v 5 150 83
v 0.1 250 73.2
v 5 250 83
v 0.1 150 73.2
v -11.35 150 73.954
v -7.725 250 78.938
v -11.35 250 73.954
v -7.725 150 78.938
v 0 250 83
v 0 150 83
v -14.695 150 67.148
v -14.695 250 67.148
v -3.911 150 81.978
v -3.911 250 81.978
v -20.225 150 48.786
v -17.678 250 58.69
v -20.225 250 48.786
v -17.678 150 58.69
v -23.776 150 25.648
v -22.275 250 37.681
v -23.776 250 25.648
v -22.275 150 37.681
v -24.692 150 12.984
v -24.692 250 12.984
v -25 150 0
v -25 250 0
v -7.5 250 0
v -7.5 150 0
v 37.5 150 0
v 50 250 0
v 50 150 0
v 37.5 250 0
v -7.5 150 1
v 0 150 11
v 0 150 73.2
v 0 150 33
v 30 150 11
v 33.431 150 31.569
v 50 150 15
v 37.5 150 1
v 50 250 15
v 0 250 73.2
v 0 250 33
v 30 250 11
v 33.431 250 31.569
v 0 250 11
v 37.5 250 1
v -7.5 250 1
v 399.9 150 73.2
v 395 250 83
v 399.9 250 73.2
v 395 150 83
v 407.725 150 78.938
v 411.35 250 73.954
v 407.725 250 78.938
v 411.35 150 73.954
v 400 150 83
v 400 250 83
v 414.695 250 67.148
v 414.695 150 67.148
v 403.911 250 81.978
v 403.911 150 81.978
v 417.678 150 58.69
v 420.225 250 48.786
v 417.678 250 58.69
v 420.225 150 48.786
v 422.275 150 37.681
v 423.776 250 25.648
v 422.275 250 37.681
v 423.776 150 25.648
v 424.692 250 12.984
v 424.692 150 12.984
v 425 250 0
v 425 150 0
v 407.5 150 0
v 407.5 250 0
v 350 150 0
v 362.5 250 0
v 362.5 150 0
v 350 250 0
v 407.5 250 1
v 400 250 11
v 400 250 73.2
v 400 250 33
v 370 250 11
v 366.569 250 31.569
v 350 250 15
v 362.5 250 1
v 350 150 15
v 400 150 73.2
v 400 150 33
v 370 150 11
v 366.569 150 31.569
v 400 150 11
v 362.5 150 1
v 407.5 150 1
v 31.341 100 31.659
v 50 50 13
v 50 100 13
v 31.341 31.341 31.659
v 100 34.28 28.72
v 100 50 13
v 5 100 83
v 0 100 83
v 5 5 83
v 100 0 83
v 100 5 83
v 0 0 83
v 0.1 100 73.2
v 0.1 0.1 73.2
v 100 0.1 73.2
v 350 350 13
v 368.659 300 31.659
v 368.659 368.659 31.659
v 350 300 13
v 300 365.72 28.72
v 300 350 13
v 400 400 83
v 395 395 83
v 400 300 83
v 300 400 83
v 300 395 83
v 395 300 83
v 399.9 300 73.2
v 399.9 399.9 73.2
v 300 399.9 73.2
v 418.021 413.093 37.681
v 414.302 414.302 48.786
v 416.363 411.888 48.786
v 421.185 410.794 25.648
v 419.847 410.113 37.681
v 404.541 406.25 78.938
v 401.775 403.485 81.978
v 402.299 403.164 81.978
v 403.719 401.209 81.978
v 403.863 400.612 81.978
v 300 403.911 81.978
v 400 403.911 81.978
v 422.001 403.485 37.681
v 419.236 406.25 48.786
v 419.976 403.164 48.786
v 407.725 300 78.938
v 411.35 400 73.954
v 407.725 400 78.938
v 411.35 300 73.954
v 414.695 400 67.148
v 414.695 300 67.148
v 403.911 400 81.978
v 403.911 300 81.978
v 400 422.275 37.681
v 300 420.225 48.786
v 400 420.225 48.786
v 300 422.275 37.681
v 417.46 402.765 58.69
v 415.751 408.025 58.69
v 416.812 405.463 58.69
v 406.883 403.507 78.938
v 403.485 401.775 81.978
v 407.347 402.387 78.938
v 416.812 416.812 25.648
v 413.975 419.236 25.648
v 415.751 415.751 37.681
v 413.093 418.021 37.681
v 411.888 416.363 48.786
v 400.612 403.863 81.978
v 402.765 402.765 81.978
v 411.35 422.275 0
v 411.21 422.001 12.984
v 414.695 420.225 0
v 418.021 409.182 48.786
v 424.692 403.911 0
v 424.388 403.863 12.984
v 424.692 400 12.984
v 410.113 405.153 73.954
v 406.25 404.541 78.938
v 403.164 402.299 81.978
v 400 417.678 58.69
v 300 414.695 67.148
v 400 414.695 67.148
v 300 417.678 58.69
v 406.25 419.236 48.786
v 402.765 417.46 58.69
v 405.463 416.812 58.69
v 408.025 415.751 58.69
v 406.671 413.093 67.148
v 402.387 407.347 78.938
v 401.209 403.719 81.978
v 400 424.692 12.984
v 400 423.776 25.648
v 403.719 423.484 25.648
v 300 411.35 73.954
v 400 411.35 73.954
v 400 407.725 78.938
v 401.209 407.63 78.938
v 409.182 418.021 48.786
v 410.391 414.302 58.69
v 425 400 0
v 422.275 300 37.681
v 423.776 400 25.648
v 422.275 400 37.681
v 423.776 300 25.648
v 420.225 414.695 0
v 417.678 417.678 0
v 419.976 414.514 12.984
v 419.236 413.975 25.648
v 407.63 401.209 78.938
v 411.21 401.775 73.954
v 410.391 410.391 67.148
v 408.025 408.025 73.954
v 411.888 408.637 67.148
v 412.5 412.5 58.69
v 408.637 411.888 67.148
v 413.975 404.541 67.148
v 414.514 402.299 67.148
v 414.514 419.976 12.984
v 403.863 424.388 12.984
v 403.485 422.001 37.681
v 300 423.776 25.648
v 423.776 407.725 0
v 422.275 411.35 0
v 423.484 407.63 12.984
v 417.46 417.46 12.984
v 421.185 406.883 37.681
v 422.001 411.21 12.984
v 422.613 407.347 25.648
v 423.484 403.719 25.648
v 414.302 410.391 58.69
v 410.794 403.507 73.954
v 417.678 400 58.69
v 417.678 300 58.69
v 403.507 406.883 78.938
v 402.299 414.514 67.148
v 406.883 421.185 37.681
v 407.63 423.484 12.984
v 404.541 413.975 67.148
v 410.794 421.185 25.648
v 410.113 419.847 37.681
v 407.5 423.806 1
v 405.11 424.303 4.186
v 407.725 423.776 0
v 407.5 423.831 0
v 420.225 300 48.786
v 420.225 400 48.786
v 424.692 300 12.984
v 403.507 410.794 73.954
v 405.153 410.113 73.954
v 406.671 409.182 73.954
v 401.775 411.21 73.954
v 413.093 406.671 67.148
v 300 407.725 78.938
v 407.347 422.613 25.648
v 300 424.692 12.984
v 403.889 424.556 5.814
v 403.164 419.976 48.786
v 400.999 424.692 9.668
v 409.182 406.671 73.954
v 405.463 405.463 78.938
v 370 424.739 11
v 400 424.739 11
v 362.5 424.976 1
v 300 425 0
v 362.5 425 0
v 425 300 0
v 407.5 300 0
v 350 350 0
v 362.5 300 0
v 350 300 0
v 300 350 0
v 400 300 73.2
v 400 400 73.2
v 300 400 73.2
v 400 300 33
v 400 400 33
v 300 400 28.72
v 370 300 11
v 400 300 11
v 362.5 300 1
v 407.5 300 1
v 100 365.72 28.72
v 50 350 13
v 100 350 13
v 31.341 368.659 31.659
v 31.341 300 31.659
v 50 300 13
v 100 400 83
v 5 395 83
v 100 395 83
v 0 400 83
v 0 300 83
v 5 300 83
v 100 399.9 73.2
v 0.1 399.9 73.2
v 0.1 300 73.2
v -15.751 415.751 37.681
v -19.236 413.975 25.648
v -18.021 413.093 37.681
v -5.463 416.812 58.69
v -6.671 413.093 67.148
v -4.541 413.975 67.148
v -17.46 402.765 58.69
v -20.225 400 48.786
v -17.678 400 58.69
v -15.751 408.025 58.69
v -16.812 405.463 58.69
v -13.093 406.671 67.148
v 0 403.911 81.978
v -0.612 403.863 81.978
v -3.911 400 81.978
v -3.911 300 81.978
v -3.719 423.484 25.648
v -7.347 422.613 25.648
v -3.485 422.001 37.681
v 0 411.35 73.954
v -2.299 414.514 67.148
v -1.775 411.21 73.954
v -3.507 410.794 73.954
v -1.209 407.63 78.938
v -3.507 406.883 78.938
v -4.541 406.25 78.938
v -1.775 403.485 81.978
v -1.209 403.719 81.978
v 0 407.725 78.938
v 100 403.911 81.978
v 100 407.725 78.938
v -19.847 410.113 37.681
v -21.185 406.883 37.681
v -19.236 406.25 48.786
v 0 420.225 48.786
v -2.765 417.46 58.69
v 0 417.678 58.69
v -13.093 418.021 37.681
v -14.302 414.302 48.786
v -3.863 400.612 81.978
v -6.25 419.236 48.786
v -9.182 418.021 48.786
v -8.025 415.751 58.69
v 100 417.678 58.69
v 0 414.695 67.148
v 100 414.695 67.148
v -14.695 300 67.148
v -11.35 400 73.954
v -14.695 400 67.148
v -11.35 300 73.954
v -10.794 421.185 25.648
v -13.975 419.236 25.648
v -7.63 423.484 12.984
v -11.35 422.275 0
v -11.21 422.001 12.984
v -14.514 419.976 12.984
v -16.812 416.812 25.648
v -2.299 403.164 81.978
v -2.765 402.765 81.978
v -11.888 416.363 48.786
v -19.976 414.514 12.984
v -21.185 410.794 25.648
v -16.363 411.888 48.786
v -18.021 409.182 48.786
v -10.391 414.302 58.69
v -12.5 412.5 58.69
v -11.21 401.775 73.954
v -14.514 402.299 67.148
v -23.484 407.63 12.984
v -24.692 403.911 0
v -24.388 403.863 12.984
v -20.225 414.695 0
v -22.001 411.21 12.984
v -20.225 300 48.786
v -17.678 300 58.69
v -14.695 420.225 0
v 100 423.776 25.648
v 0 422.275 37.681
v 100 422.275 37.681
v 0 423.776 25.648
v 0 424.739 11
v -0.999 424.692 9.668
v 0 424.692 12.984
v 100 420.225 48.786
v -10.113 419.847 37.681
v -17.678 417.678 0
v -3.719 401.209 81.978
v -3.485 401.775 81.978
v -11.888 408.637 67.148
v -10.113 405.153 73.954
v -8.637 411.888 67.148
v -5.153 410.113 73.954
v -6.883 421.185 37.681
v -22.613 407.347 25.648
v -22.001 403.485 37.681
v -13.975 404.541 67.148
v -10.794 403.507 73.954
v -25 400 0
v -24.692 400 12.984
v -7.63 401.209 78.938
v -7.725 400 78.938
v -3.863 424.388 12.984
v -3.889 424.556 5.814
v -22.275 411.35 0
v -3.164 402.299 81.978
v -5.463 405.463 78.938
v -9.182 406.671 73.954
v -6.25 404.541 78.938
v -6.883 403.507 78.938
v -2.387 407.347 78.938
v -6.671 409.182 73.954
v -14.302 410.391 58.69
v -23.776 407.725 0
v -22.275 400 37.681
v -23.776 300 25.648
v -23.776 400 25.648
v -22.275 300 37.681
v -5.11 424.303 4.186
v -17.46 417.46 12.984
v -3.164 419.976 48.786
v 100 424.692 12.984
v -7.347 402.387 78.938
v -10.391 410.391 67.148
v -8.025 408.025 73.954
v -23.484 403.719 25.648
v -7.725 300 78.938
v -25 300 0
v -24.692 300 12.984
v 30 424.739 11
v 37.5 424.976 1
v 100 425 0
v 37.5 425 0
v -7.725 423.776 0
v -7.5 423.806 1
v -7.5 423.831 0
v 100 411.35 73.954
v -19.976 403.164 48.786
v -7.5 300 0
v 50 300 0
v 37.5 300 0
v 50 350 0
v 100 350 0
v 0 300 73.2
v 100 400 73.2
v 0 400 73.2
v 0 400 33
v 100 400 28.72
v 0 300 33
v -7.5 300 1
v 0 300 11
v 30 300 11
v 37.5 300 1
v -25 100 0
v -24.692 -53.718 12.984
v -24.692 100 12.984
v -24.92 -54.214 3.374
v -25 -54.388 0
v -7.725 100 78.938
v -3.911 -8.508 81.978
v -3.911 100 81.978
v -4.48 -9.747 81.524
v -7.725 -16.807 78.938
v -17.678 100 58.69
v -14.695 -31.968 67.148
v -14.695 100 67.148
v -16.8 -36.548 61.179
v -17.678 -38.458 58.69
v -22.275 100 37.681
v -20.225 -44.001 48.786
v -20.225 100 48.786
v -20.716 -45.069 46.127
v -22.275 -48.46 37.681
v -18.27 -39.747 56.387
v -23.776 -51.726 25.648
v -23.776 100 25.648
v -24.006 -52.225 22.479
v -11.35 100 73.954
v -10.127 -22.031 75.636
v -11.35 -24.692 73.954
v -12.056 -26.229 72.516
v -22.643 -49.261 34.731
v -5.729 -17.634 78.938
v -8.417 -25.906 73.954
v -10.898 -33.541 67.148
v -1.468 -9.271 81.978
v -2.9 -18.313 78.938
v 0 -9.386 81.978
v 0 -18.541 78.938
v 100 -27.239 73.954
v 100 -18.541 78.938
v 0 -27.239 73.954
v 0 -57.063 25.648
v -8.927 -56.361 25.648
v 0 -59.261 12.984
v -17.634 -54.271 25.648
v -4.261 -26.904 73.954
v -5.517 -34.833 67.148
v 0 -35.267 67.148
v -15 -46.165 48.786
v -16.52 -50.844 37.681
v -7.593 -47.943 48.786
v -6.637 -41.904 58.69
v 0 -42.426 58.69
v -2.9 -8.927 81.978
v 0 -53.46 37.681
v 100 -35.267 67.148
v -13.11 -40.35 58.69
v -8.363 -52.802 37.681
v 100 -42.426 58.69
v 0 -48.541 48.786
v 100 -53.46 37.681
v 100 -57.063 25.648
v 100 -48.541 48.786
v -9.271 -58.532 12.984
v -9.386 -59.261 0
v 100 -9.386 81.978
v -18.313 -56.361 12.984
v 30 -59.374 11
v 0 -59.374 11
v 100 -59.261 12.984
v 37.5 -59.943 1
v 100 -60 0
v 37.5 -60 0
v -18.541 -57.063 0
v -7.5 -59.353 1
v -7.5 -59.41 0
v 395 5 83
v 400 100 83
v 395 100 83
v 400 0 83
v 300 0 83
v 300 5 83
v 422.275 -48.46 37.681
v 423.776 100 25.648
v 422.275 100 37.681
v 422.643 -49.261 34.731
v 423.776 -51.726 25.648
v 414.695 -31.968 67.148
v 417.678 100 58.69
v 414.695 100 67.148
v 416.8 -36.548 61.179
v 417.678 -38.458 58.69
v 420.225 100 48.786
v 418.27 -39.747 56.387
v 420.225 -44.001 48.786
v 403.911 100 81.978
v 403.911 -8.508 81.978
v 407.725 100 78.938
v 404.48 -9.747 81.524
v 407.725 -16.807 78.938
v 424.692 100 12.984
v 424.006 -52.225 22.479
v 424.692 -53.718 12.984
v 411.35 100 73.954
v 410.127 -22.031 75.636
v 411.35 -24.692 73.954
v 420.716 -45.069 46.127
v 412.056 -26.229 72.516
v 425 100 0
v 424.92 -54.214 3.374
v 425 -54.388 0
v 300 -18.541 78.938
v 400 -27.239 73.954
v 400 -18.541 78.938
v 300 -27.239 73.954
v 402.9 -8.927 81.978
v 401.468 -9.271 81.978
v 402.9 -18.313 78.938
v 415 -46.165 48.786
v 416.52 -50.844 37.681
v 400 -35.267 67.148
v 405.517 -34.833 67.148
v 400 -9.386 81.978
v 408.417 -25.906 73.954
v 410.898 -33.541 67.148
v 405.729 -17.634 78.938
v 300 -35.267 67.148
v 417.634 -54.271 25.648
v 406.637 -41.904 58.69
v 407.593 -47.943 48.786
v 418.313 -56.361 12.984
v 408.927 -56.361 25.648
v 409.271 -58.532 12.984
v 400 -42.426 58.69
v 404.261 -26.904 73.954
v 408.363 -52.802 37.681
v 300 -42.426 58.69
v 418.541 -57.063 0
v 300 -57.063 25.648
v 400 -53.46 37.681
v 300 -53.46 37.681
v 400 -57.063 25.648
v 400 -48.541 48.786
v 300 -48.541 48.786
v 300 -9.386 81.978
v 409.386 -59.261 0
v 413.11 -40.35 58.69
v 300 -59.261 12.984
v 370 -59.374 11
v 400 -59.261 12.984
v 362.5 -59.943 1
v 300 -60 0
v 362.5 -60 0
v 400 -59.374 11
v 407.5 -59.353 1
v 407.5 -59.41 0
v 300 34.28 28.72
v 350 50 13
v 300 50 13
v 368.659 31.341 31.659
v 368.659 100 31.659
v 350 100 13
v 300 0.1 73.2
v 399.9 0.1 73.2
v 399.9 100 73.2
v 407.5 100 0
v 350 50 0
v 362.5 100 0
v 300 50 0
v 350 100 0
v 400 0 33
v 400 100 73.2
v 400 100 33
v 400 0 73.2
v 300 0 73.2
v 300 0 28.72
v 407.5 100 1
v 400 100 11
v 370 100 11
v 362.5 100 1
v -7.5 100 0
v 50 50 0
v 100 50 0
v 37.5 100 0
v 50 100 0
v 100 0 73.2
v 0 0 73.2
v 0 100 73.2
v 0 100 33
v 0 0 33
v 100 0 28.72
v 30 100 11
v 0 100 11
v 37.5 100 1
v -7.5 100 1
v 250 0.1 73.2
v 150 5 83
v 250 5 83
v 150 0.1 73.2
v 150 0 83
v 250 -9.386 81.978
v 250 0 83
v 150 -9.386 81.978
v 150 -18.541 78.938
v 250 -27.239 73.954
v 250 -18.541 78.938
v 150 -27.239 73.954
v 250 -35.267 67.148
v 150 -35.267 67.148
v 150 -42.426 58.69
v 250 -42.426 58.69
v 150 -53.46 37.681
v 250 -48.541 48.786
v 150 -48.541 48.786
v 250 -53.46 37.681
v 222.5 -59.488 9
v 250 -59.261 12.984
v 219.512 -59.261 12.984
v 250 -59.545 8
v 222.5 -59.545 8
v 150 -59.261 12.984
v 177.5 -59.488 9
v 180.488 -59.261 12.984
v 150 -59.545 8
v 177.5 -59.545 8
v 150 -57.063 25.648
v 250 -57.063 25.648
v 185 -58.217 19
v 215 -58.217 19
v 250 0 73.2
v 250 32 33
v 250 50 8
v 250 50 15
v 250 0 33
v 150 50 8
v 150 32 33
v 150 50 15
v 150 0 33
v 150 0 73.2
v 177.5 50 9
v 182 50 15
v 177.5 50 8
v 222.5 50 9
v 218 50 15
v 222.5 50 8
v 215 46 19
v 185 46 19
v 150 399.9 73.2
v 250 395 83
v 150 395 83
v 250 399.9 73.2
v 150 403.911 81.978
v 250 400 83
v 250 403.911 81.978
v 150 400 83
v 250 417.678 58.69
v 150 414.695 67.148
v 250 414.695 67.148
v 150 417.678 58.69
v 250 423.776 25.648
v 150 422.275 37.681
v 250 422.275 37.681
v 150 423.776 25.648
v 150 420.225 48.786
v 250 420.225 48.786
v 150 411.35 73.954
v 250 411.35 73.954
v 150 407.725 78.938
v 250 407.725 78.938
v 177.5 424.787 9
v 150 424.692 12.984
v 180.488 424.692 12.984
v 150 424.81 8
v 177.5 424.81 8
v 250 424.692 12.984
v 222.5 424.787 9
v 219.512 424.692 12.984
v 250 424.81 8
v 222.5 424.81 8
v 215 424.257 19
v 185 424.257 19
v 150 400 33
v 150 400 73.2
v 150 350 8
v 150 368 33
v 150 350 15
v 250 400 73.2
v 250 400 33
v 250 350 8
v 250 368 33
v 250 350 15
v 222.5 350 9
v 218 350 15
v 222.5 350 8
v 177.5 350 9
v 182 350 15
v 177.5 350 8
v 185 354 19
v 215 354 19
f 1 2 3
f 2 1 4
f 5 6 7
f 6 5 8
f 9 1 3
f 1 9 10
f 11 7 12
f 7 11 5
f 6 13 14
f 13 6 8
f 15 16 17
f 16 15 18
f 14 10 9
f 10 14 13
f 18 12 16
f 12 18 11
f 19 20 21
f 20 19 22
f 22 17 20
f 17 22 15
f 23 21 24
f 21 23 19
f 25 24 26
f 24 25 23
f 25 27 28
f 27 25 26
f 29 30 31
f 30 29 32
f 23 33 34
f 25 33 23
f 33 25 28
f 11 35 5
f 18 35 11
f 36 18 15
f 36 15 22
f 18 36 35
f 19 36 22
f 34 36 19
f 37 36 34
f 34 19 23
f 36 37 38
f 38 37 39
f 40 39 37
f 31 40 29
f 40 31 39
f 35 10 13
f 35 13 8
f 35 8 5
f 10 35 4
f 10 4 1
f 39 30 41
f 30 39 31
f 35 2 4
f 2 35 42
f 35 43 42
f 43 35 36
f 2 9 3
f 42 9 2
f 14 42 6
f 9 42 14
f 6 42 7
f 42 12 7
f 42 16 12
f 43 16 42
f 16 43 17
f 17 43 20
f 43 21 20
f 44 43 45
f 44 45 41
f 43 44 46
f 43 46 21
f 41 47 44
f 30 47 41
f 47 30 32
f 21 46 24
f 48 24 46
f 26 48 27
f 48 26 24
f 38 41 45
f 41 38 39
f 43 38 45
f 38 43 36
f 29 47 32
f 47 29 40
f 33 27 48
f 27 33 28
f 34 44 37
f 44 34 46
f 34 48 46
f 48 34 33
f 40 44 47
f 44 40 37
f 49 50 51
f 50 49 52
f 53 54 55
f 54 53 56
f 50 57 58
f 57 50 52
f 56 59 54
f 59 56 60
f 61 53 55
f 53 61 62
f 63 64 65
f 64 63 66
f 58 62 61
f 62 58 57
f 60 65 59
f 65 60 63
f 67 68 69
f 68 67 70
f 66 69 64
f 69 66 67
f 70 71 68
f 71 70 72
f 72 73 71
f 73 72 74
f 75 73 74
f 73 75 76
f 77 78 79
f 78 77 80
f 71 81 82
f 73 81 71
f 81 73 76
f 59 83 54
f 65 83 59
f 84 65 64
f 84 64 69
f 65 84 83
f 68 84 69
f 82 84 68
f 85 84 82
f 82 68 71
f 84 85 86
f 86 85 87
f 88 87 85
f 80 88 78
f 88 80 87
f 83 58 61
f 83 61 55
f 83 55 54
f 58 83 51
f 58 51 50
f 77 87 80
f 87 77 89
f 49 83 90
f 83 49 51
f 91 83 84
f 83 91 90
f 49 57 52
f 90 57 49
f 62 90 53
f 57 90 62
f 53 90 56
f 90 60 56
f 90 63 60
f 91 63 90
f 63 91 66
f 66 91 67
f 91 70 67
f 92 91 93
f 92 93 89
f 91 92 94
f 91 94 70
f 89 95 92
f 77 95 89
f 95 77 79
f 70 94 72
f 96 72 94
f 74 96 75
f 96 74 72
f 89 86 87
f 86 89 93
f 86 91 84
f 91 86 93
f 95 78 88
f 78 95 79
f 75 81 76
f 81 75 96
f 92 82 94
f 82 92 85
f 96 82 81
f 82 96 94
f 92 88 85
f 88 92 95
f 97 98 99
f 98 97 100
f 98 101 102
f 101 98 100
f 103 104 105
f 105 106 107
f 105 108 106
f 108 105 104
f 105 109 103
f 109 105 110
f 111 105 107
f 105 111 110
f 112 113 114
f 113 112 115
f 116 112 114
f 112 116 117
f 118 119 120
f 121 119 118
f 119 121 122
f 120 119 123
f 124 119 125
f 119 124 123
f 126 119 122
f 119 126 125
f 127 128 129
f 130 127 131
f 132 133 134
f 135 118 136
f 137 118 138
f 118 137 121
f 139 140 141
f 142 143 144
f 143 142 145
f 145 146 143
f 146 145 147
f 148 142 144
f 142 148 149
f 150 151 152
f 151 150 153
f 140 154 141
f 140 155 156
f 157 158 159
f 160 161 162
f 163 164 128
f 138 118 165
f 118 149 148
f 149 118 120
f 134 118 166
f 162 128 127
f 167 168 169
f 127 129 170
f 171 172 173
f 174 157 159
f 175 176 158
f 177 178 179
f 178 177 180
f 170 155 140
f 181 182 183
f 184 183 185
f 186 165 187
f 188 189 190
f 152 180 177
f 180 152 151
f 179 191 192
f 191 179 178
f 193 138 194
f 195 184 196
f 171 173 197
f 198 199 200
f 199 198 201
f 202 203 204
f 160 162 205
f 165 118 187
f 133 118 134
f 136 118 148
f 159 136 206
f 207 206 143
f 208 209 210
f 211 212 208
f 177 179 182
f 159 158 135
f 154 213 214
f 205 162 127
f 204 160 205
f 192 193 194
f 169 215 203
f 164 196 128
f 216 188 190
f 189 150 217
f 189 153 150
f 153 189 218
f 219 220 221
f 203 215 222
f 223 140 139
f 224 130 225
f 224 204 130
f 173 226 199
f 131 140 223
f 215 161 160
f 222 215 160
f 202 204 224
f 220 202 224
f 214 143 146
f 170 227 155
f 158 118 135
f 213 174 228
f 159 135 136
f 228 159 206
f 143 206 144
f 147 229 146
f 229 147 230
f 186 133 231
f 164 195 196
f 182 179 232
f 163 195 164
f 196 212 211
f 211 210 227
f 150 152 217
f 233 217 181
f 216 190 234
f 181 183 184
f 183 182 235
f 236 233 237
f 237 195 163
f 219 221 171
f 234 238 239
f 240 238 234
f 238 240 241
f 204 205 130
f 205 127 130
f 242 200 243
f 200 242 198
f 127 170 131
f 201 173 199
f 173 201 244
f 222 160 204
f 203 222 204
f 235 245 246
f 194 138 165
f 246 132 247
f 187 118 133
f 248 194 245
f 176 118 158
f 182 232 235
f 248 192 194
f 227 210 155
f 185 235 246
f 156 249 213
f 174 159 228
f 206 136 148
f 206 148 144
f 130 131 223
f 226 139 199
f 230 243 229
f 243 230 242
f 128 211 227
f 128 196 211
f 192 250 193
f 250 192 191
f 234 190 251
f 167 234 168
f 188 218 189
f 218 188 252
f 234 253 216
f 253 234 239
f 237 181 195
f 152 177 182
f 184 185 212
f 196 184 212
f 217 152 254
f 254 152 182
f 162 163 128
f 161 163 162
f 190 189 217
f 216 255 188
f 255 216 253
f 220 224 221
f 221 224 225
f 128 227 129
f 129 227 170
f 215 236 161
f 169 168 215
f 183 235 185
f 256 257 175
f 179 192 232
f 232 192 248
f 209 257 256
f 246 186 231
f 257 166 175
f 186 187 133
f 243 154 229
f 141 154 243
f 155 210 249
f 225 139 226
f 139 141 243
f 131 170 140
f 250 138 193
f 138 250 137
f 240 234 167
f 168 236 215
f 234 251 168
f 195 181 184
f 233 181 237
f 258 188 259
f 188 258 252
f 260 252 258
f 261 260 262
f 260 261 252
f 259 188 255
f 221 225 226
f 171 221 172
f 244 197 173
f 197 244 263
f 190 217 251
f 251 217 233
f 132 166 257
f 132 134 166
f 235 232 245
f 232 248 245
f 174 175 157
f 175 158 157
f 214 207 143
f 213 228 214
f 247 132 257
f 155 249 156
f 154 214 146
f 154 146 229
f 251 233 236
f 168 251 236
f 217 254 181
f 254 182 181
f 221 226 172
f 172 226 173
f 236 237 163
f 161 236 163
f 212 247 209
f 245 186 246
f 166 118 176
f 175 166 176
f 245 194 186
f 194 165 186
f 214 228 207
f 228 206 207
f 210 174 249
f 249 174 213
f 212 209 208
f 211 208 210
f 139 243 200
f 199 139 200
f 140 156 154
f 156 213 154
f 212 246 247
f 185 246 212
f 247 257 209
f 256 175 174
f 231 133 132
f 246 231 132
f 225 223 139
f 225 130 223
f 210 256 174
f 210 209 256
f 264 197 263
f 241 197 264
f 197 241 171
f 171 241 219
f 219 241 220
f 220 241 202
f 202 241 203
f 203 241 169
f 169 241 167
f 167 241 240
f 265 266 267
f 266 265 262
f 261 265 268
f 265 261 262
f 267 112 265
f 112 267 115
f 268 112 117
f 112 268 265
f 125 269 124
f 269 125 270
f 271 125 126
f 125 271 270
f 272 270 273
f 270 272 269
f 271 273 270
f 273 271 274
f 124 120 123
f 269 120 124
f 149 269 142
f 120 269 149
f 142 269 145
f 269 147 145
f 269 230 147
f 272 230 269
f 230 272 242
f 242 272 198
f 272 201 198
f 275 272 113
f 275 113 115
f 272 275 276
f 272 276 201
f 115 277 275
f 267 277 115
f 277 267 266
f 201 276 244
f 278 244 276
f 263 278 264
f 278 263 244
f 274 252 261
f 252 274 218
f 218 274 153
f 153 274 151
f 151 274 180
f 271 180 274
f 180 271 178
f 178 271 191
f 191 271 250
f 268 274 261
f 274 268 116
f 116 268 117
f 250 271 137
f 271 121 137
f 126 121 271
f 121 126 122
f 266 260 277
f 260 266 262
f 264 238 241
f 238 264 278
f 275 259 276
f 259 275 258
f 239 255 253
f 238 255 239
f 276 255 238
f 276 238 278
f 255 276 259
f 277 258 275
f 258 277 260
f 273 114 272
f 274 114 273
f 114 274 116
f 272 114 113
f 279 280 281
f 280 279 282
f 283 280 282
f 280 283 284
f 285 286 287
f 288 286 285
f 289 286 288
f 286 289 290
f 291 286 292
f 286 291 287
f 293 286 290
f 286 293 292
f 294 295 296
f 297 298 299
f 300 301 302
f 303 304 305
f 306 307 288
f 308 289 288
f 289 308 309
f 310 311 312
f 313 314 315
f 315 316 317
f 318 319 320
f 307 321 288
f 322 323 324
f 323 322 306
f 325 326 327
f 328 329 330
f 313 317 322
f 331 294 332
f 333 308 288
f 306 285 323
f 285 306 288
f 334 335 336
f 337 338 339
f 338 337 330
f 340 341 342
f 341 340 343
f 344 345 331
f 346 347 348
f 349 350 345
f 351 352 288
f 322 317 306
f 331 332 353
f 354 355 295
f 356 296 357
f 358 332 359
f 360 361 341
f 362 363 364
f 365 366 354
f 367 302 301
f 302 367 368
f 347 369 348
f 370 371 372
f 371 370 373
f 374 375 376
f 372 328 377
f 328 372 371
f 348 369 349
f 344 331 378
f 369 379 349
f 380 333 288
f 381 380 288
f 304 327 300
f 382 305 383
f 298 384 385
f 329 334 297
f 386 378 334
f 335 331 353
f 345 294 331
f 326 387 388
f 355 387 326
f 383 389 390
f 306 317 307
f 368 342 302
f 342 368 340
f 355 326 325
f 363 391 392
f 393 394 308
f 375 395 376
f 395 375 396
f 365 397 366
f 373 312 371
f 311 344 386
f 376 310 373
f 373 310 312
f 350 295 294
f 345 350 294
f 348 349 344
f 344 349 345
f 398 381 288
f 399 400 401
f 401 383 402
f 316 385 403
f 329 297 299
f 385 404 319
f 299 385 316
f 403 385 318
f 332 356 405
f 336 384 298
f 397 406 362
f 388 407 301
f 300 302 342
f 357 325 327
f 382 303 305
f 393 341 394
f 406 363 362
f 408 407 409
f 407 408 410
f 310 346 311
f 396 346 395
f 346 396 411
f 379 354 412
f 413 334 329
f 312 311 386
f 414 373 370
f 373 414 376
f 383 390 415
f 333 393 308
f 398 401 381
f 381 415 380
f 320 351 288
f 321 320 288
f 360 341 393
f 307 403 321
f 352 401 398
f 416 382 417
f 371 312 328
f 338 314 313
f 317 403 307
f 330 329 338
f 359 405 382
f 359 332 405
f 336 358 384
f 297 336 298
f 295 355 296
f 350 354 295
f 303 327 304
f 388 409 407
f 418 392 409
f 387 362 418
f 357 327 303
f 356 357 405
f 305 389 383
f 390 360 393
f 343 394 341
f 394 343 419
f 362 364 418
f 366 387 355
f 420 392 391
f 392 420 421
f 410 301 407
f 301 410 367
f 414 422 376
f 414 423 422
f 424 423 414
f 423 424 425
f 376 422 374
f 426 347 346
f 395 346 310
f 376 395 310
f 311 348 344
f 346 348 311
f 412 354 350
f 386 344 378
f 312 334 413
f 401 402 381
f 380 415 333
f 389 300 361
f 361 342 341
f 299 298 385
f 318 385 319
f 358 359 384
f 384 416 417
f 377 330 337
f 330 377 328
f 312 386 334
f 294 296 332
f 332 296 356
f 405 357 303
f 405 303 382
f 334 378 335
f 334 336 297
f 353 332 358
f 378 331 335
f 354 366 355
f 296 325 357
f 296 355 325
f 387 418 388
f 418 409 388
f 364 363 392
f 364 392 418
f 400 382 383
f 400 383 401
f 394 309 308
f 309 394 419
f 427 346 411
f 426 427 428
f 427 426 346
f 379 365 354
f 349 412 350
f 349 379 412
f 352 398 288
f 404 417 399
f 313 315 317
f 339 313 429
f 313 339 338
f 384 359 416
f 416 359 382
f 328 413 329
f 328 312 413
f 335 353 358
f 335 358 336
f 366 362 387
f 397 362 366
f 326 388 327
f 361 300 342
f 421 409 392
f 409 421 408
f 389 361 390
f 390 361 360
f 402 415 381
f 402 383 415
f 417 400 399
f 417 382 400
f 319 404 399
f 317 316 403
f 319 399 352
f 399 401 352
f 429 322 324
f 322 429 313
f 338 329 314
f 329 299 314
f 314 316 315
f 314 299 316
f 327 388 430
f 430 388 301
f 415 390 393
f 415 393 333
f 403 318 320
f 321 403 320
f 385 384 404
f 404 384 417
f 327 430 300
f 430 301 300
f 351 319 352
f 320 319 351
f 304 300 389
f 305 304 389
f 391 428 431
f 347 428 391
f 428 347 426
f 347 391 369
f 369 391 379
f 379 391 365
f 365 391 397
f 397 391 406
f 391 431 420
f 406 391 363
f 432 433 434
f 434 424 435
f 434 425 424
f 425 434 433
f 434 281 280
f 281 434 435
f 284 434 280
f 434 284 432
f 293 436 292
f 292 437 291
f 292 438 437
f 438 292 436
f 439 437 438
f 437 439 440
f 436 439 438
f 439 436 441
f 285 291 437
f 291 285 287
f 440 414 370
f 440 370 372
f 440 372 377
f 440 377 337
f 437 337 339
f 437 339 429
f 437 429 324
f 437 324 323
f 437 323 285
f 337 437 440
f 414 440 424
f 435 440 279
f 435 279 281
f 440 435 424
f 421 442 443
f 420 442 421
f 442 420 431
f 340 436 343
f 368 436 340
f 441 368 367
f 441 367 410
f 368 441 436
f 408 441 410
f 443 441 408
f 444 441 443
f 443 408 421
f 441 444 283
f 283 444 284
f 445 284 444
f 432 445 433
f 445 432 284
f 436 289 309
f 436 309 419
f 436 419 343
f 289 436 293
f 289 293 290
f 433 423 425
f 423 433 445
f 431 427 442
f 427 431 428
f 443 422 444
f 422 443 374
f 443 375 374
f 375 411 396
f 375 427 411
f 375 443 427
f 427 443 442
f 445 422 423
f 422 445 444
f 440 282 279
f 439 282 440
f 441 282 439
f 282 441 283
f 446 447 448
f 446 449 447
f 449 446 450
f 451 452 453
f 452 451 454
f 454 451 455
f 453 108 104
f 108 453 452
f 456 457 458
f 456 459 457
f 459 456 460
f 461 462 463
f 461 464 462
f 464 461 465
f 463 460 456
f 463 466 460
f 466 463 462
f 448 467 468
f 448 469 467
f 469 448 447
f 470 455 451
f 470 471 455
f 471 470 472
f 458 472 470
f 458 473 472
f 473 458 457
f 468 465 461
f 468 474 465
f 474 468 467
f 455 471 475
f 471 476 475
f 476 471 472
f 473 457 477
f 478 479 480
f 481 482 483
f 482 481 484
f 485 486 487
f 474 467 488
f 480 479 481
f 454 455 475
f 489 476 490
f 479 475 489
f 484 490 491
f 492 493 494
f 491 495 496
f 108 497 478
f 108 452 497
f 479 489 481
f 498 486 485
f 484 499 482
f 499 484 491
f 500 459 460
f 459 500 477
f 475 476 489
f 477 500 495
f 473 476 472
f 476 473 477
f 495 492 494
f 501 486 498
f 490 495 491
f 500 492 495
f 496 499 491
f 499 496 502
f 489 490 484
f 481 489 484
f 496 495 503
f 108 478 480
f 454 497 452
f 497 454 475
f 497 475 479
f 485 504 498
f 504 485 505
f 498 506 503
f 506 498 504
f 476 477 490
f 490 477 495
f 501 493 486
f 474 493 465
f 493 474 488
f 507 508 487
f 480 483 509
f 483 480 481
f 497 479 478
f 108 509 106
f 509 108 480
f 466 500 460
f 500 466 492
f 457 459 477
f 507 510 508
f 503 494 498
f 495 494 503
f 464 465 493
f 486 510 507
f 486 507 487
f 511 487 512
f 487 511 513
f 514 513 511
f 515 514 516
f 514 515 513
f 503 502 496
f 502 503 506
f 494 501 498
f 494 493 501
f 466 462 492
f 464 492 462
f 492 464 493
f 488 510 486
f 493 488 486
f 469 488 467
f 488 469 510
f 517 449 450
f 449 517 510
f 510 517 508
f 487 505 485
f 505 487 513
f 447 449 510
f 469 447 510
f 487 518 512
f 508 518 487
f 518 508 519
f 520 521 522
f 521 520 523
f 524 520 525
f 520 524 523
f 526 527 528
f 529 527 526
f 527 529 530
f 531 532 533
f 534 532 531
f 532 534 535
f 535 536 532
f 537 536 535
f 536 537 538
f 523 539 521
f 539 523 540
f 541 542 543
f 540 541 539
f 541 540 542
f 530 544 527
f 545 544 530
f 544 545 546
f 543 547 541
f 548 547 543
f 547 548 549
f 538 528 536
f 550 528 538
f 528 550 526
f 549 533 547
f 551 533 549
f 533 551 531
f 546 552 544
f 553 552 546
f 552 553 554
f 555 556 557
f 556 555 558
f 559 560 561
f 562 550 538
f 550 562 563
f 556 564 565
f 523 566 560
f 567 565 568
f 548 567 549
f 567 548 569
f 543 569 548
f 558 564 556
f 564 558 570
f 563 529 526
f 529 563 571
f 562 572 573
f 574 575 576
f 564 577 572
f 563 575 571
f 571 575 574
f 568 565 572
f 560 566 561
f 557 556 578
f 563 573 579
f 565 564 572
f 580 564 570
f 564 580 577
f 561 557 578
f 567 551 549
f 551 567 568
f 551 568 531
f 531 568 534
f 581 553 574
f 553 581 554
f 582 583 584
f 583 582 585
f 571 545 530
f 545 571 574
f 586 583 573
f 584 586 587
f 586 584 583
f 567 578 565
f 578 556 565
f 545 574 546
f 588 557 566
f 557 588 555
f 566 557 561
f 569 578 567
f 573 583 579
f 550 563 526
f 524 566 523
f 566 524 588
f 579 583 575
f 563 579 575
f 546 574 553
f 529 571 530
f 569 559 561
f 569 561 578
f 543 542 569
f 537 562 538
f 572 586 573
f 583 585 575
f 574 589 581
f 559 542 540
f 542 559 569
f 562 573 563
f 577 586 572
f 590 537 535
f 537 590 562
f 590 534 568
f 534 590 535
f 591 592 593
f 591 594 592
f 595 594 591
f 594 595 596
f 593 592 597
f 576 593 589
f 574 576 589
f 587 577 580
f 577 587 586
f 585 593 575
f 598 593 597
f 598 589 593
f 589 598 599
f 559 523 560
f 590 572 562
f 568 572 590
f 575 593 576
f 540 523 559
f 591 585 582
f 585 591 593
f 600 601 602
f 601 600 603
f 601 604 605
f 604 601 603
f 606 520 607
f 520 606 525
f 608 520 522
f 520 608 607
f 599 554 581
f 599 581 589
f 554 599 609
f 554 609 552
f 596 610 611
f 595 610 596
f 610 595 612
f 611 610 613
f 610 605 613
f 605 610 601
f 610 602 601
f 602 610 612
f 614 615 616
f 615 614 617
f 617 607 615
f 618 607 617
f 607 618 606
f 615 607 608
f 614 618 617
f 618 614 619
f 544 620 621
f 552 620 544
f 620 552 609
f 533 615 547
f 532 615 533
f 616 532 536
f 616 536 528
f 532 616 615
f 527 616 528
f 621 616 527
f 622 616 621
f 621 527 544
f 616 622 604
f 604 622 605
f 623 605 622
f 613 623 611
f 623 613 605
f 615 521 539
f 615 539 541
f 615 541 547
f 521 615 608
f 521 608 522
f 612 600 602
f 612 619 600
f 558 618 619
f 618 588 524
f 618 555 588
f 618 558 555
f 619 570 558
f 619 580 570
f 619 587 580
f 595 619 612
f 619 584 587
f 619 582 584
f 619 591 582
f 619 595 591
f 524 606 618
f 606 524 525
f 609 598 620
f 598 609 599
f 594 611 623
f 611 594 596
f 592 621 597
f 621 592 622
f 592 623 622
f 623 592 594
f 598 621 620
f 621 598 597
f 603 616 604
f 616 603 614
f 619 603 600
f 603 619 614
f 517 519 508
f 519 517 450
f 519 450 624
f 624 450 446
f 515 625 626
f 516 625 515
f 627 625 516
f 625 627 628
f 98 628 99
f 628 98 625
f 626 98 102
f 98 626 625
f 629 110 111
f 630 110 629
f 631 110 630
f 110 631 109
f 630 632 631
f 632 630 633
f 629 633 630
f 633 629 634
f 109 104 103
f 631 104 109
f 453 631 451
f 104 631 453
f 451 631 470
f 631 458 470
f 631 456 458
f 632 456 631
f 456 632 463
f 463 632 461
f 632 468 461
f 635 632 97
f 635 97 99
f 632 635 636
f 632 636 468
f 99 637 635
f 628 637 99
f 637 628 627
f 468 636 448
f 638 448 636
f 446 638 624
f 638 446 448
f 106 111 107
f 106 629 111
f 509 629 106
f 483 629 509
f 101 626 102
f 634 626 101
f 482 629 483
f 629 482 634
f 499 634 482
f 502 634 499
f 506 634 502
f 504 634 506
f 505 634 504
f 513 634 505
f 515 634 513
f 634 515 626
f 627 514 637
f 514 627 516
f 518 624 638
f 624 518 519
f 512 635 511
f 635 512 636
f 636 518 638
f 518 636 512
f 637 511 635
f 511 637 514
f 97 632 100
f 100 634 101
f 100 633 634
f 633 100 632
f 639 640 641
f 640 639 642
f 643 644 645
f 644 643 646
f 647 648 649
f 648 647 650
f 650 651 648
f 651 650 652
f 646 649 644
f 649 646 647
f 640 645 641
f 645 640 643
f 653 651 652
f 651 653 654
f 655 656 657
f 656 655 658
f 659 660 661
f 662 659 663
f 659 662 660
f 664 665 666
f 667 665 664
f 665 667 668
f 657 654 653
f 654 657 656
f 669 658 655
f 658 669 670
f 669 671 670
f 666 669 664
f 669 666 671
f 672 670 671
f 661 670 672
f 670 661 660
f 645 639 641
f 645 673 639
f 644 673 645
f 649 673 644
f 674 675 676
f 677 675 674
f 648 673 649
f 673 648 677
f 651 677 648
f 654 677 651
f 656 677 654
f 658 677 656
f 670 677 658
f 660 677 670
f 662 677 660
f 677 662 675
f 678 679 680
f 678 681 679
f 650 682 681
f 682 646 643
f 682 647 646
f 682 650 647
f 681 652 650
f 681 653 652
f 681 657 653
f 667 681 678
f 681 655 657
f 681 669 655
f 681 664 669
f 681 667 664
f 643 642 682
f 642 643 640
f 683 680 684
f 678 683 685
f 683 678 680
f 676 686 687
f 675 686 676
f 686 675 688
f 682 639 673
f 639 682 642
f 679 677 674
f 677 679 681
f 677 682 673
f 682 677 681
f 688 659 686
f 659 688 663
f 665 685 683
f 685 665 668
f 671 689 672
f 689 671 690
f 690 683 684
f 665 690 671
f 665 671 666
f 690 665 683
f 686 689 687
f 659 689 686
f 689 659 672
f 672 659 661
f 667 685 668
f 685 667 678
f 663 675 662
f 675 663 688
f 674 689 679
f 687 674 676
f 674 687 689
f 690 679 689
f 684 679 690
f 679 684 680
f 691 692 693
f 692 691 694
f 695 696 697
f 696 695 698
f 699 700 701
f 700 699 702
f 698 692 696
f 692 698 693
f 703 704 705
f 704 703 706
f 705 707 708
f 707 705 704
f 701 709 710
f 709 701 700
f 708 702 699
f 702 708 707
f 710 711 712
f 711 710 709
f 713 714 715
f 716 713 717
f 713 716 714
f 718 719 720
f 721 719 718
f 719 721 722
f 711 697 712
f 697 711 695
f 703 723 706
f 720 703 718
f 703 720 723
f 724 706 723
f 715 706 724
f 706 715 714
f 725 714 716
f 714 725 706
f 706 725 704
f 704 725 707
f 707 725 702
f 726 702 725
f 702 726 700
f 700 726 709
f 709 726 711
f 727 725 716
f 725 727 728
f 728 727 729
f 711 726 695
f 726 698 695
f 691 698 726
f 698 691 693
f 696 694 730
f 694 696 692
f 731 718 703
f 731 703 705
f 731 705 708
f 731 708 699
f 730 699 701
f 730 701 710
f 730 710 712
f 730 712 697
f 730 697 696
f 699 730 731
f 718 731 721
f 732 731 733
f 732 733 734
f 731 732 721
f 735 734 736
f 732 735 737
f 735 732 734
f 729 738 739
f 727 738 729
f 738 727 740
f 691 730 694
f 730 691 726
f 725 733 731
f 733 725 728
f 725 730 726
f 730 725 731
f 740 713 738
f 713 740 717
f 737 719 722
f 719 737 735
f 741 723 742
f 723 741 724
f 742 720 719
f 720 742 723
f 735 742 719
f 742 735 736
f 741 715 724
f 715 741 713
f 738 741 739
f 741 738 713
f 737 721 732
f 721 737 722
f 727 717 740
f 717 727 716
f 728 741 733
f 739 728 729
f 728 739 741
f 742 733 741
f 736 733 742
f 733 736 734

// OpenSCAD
$fn = 40; 
include <MCAD/2Dshapes.scad>;

preview_maly ();
//preview ();
//strana ();
//predek ();
//zadek ();
//predni_roh_P ();
//predni_roh_L ();
//zadni_roh_P ();
//zadni_roh_L ();

module preview_maly () {
	translate ([0, 150, 0]) strana ();
	translate ([400, 250, 0]) rotate ([0, 0, 180]) strana ();
	translate ([400, 400, 0]) rotate ([0, 0, 180])   zadni_roh_P ();
	translate ([0,400, 0]) zadni_roh_L ();
	translate ([400, 0, 0]) predni_roh_P ();
	predni_roh_L(); 
	translate ([200, 0, 0]) predek ();
	translate ([200, 400, 0]) rotate ([0, 0, 180]) zadek ();
}
module preview () {
	translate ([960, 0, 0]) %vyrez_podlahy ();
	%vyrez_podlahy ();
	translate ([0,0,33]) solar ();
	translate ([0, 800, 0]) strana ();
	translate ([990, 900, 0]) rotate ([0, 0, 180]) strana ();
	translate ([990, 1650, 0]) rotate ([0, 0, 180])   zadni_roh_P ();
	translate ([0,1650, 0]) zadni_roh_L ();
	translate ([990, 0, 0]) predni_roh_P ();
	predni_roh_L(); 
	translate ([445, 0, 0]) predek ();
	translate ([445, 1650, 0]) rotate ([0, 0, 180]) zadek ();
}

module prism(l, w, h){						// Rutina k vytvoreni klinu
       polyhedron(
               points=[[0,0,0], [l,0,0], [l,w,0], [0,w,0], [0,w,h], [l,w,h]],
               faces=[[0,1,2,3],[5,4,3,2],[0,4,5,1],[0,3,4],[5,2,1]]
               );
}

module solar () {
	 %cube ([990, 1650, 40]);
}

module vyrez_podlahy () {
	translate ([0, 1720]) rotate ([90, 0, 0]) linear_extrude (1800) 
		difference () {
			hull () {
				square ([30, 10]);
				translate ([-7.5, -10]) square ([45, 10]);
			}
			translate ([-7.5, -12]) square ([45, 10]);
		}
}

module strana () {
	difference () {
		translate ([0, 0, -10]) minkowski () {
			rotate_extrude () ellipsePart (50, 166,2);
			cube ([200,  200, 10]);
		}
		translate ([0,0,-250]) cube (500, true);
		translate ([-50,-50,-10]) cube ([300, 50, 100]);
		translate ([50,-10,-10]) cube ([300, 300, 100]);
		translate ([0,-10,33]) cube ([60, 300, 40.2]);
		translate ([-100,100,-10]) cube (300);
		translate ([1,-50,64]) rotate ([0, 45, 0])  cube ([100, 200, 100]);
		translate ([0, 100, 33]) rotate ([0, 0, -90]) prism (100, 100, -4.28);

		translate ([0, -10, 73]) union () {
		 translate ([5,0,0]) cube (200);
		 mirror ([1,0,0]) rotate (90) prism (200, 10, 20);
		}
		translate ([0, 0, 1]) vyrez_podlahy ();
	}
}

module zadek () {
	difference () {
		translate ([-100, 0, 0]) 
			translate ([0,0,-10]) minkowski () {
				rotate_extrude () ellipsePart (50, 166,2);
				cube ([200,  200, 10]);
			}
		translate ([350, 0, 0]) cube (600, center=true);
		translate ([-350, 0, 0]) cube (600, center=true);
		translate ([0, 0, -300]) cube (600, center=true);
		translate ([0, 350, 0]) cube (600, center=true);
		translate ([-60,0,33]) cube ([120, 60, 40.2]);
		translate ([100, 0, 0]) rotate ([0, 0, 90]) translate ([0, -10, 73]) union () {
			translate ([5,0,0]) cube (200);
			mirror ([1,0,0]) rotate (90) prism (200, 10, 20);
		}
		translate ([-15, 0, 9]) vyrez_podlahy ();
		cube ([200, 200, 16], center=true);
		translate ([60, 1, 64]) rotate ([0, 45, 90])  cube ([100, 200, 100]);
	}
}

module predek () {
	difference () {
		translate ([-100, 0, 0]) 
			translate ([0,0,-10]) minkowski () {
				rotate_extrude () ellipsePart (120, 166,2);
				cube ([200,  200, 10]);
			}
		translate ([350, 0, 0]) cube (600, center=true);
		translate ([-350, 0, 0]) cube (600, center=true);
		translate ([0, 0, -300]) cube (600, center=true);
		translate ([0, 350, 0]) cube (600, center=true);
		translate ([-60,0,33]) cube ([120, 60, 40.2]);
		translate ([100, 0, 0]) rotate ([0, 0, 90]) translate ([0, -10, 73]) union () {
			translate ([5,0,0]) cube (200);
			mirror ([1,0,0]) rotate (90) prism (200, 10, 20);
		}
		translate ([-15, 0, 9]) vyrez_podlahy ();
		cube ([200, 200, 16], center=true);
		translate ([60, 1, 64]) rotate ([0, 45, 90])  cube ([100, 200, 100]);
	}
}

module predni_roh_P () {
	difference () {
		translate ([-200, 0, 0]) intersection () {
			translate ([0,-100,-10]) minkowski () {
				rotate_extrude () ellipsePart (50, 166,2);
				cube ([200,  200, 10]);
			}
			translate ([0,0,-10]) minkowski () {
				rotate_extrude () ellipsePart (120, 166,2);
				cube ([200,  200, 10]);
			}
		}
		translate ([0,0,-250]) cube (500, true);
		translate ([-350,50,-10]) cube ([300, 300, 100]);
		translate ([-300,0,33]) cube ([300, 300, 40.2]);
		translate ([-100,100,-10]) cube (200);
		rotate (90) translate ([-100,100,-10]) cube (200);
		translate ([-30, 0, 1]) vyrez_podlahy ();
		translate ([-1, 50, 64]) rotate ([0, -135, 0])  cube ([100, 100, 100]);
		translate ([-50,1,64]) rotate ([0, 45,90])  cube ([100, 100, 100]);
		translate ([0, 0, 33]) rotate ([0, 0, -270]) prism (100, 100, -4.28);
		rotate ([0, 0, 90]) translate ([30, 30, 33]) intersection () {
			translate ([0,0,0]) rotate ([0, 45, 0])  cube ([100, 100, 100]);
			translate ([100,0,0]) rotate ([0, 45,90])  cube ([100, 100, 100]);
		}
		rotate ([0, 0,  90]) intersection () {
			translate ([0, 0, 73]) union () {
			 translate ([5,0,0]) cube ([110, 110, 10]);
			 mirror ([1,0,0]) rotate (90) prism (110, 10, 20);
			}
			translate ([110, 0, 0]) rotate (90) translate ([0, 0, 73]) union () {
			 translate ([5,0,0]) cube ([110, 110, 10]);
			 mirror ([1,0,0]) rotate (90) prism (110, 10, 20);
			}
		}
	}
}
module predni_roh_L () {
	difference () {
		intersection () {
			translate ([0,-100,-10]) minkowski () {
				rotate_extrude () ellipsePart (50, 166,2);
				cube ([200,  200, 10]);
			}
			translate ([0,0,-10]) minkowski () {
				rotate_extrude () ellipsePart (120, 166,2);
				cube ([200,  200, 10]);
			}
		}
		translate ([0,0,-250]) cube (500, true);
		translate ([50,50,-10]) cube ([300, 300, 100]);
		translate ([0,0,33]) cube ([300, 300, 40.2]);
		translate ([-100,100,-10]) cube (200);
		rotate (-90) translate ([-100,100,-10]) cube (200);
		translate ([0, 0, 1]) vyrez_podlahy ();
		translate ([1,50,64]) rotate ([0, 45, 0])  cube ([100, 100, 100]);
		translate ([150,1,64]) rotate ([0, 45,90])  cube ([100, 100, 100]);
		translate ([30, 30, 33]) intersection () {
			translate ([0,0,0]) rotate ([0, 45, 0])  cube ([100, 100, 100]);
			translate ([100,0,0]) rotate ([0, 45,90])  cube ([100, 100, 100]);
		}
		intersection () {
			translate ([0, 0, 73]) union () {
			 translate ([5,0,0]) cube ([110, 110, 10]);
			 mirror ([1,0,0]) rotate (90) prism (110, 10, 20);
			}
			translate ([110, 0, 0]) rotate (90) translate ([0, 0, 73]) union () {
			 translate ([5,0,0]) cube ([110, 110, 10]);
			 mirror ([1,0,0]) rotate (90) prism (110, 10, 20);
			}
		}
		translate ([0, 100, 33]) rotate ([0, 0, -90]) prism (100, 100, -4.28);
		
	}
}

module  zadni_roh_L () {
	difference () {
		rotate ([0, 0, -90]) difference () {
			translate ([0,0,-10]) minkowski () {
				rotate_extrude () ellipsePart (50, 166,2);
				cube ([200,  200, 10]);
			}
			translate ([0,0,-250]) cube (500, true);
			translate ([50,50,-10]) cube ([300, 300, 100]);
			translate ([0,0,33]) cube ([300, 300, 40.2]);
			translate ([-100,100,-10]) cube (200);
			rotate (-90) translate ([-100,100,-10]) cube (200);

			translate ([1,50,64]) rotate ([0, 45, 0])  cube ([100, 100, 100]);
			translate ([150,1,64]) rotate ([0, 45,90])  cube ([100, 100, 100]);
			translate ([30, 30, 33]) intersection () {
				translate ([0,0,0]) rotate ([0, 45, 0])  cube ([100, 100, 100]);
				translate ([100,0,0]) rotate ([0, 45,90])  cube ([100, 100, 100]);
			}
			intersection () {
				translate ([0, 0, 73]) union () {
				 translate ([5,0,0]) cube ([110, 110, 10]);
				 mirror ([1,0,0]) rotate (90) prism (110, 10, 20);
				}
				translate ([110, 0, 0]) rotate (90) translate ([0, 0, 73]) union () {
				 translate ([5,0,0]) cube ([110, 110, 10]);
				 mirror ([1,0,0]) rotate (90) prism (110, 10, 20);
				}
			}
		}
		translate ([0, -110, 1]) vyrez_podlahy ();
		translate ([0, 0, 33]) rotate ([0, 0,-90]) prism (100, 100, -4.28);
	}
}

module  zadni_roh_P () {
	difference () {
		translate ([0,0,-10]) minkowski () {
			rotate_extrude () ellipsePart (50, 166,2);
			cube ([200,  200, 10]);
		}
		translate ([0,0,-250]) cube (500, true);
		translate ([50,50,-10]) cube ([300, 300, 100]);
		translate ([0,0,33]) cube ([300, 300, 40.2]);
		translate ([-100,100,-10]) cube (200);
		rotate (-90) translate ([-100,100,-10]) cube (200);
		translate ([0, 0, 1]) vyrez_podlahy ();

		translate ([1,50,64]) rotate ([0, 45, 0])  cube ([100, 100, 100]);
		translate ([150,1,64]) rotate ([0, 45,90])  cube ([100, 100, 100]);
		translate ([30, 30, 33]) intersection () {
			translate ([0,0,0]) rotate ([0, 45, 0])  cube ([100, 100, 100]);
			translate ([100,0,0]) rotate ([0, 45,90])  cube ([100, 100, 100]);
		}
		intersection () {
			translate ([0, 0, 73]) union () {
			 translate ([5,0,0]) cube ([110, 110, 10]);
			 mirror ([1,0,0]) rotate (90) prism (110, 10, 20);
			}
			translate ([110, 0, 0]) rotate (90) translate ([0, 0, 73]) union () {
			 translate ([5,0,0]) cube ([110, 110, 10]);
			 mirror ([1,0,0]) rotate (90) prism (110, 10, 20);
			}
		}
		translate ([0, 100, 33]) rotate ([0, 0,-90]) prism (100, 100, -4.28);
	}
}
